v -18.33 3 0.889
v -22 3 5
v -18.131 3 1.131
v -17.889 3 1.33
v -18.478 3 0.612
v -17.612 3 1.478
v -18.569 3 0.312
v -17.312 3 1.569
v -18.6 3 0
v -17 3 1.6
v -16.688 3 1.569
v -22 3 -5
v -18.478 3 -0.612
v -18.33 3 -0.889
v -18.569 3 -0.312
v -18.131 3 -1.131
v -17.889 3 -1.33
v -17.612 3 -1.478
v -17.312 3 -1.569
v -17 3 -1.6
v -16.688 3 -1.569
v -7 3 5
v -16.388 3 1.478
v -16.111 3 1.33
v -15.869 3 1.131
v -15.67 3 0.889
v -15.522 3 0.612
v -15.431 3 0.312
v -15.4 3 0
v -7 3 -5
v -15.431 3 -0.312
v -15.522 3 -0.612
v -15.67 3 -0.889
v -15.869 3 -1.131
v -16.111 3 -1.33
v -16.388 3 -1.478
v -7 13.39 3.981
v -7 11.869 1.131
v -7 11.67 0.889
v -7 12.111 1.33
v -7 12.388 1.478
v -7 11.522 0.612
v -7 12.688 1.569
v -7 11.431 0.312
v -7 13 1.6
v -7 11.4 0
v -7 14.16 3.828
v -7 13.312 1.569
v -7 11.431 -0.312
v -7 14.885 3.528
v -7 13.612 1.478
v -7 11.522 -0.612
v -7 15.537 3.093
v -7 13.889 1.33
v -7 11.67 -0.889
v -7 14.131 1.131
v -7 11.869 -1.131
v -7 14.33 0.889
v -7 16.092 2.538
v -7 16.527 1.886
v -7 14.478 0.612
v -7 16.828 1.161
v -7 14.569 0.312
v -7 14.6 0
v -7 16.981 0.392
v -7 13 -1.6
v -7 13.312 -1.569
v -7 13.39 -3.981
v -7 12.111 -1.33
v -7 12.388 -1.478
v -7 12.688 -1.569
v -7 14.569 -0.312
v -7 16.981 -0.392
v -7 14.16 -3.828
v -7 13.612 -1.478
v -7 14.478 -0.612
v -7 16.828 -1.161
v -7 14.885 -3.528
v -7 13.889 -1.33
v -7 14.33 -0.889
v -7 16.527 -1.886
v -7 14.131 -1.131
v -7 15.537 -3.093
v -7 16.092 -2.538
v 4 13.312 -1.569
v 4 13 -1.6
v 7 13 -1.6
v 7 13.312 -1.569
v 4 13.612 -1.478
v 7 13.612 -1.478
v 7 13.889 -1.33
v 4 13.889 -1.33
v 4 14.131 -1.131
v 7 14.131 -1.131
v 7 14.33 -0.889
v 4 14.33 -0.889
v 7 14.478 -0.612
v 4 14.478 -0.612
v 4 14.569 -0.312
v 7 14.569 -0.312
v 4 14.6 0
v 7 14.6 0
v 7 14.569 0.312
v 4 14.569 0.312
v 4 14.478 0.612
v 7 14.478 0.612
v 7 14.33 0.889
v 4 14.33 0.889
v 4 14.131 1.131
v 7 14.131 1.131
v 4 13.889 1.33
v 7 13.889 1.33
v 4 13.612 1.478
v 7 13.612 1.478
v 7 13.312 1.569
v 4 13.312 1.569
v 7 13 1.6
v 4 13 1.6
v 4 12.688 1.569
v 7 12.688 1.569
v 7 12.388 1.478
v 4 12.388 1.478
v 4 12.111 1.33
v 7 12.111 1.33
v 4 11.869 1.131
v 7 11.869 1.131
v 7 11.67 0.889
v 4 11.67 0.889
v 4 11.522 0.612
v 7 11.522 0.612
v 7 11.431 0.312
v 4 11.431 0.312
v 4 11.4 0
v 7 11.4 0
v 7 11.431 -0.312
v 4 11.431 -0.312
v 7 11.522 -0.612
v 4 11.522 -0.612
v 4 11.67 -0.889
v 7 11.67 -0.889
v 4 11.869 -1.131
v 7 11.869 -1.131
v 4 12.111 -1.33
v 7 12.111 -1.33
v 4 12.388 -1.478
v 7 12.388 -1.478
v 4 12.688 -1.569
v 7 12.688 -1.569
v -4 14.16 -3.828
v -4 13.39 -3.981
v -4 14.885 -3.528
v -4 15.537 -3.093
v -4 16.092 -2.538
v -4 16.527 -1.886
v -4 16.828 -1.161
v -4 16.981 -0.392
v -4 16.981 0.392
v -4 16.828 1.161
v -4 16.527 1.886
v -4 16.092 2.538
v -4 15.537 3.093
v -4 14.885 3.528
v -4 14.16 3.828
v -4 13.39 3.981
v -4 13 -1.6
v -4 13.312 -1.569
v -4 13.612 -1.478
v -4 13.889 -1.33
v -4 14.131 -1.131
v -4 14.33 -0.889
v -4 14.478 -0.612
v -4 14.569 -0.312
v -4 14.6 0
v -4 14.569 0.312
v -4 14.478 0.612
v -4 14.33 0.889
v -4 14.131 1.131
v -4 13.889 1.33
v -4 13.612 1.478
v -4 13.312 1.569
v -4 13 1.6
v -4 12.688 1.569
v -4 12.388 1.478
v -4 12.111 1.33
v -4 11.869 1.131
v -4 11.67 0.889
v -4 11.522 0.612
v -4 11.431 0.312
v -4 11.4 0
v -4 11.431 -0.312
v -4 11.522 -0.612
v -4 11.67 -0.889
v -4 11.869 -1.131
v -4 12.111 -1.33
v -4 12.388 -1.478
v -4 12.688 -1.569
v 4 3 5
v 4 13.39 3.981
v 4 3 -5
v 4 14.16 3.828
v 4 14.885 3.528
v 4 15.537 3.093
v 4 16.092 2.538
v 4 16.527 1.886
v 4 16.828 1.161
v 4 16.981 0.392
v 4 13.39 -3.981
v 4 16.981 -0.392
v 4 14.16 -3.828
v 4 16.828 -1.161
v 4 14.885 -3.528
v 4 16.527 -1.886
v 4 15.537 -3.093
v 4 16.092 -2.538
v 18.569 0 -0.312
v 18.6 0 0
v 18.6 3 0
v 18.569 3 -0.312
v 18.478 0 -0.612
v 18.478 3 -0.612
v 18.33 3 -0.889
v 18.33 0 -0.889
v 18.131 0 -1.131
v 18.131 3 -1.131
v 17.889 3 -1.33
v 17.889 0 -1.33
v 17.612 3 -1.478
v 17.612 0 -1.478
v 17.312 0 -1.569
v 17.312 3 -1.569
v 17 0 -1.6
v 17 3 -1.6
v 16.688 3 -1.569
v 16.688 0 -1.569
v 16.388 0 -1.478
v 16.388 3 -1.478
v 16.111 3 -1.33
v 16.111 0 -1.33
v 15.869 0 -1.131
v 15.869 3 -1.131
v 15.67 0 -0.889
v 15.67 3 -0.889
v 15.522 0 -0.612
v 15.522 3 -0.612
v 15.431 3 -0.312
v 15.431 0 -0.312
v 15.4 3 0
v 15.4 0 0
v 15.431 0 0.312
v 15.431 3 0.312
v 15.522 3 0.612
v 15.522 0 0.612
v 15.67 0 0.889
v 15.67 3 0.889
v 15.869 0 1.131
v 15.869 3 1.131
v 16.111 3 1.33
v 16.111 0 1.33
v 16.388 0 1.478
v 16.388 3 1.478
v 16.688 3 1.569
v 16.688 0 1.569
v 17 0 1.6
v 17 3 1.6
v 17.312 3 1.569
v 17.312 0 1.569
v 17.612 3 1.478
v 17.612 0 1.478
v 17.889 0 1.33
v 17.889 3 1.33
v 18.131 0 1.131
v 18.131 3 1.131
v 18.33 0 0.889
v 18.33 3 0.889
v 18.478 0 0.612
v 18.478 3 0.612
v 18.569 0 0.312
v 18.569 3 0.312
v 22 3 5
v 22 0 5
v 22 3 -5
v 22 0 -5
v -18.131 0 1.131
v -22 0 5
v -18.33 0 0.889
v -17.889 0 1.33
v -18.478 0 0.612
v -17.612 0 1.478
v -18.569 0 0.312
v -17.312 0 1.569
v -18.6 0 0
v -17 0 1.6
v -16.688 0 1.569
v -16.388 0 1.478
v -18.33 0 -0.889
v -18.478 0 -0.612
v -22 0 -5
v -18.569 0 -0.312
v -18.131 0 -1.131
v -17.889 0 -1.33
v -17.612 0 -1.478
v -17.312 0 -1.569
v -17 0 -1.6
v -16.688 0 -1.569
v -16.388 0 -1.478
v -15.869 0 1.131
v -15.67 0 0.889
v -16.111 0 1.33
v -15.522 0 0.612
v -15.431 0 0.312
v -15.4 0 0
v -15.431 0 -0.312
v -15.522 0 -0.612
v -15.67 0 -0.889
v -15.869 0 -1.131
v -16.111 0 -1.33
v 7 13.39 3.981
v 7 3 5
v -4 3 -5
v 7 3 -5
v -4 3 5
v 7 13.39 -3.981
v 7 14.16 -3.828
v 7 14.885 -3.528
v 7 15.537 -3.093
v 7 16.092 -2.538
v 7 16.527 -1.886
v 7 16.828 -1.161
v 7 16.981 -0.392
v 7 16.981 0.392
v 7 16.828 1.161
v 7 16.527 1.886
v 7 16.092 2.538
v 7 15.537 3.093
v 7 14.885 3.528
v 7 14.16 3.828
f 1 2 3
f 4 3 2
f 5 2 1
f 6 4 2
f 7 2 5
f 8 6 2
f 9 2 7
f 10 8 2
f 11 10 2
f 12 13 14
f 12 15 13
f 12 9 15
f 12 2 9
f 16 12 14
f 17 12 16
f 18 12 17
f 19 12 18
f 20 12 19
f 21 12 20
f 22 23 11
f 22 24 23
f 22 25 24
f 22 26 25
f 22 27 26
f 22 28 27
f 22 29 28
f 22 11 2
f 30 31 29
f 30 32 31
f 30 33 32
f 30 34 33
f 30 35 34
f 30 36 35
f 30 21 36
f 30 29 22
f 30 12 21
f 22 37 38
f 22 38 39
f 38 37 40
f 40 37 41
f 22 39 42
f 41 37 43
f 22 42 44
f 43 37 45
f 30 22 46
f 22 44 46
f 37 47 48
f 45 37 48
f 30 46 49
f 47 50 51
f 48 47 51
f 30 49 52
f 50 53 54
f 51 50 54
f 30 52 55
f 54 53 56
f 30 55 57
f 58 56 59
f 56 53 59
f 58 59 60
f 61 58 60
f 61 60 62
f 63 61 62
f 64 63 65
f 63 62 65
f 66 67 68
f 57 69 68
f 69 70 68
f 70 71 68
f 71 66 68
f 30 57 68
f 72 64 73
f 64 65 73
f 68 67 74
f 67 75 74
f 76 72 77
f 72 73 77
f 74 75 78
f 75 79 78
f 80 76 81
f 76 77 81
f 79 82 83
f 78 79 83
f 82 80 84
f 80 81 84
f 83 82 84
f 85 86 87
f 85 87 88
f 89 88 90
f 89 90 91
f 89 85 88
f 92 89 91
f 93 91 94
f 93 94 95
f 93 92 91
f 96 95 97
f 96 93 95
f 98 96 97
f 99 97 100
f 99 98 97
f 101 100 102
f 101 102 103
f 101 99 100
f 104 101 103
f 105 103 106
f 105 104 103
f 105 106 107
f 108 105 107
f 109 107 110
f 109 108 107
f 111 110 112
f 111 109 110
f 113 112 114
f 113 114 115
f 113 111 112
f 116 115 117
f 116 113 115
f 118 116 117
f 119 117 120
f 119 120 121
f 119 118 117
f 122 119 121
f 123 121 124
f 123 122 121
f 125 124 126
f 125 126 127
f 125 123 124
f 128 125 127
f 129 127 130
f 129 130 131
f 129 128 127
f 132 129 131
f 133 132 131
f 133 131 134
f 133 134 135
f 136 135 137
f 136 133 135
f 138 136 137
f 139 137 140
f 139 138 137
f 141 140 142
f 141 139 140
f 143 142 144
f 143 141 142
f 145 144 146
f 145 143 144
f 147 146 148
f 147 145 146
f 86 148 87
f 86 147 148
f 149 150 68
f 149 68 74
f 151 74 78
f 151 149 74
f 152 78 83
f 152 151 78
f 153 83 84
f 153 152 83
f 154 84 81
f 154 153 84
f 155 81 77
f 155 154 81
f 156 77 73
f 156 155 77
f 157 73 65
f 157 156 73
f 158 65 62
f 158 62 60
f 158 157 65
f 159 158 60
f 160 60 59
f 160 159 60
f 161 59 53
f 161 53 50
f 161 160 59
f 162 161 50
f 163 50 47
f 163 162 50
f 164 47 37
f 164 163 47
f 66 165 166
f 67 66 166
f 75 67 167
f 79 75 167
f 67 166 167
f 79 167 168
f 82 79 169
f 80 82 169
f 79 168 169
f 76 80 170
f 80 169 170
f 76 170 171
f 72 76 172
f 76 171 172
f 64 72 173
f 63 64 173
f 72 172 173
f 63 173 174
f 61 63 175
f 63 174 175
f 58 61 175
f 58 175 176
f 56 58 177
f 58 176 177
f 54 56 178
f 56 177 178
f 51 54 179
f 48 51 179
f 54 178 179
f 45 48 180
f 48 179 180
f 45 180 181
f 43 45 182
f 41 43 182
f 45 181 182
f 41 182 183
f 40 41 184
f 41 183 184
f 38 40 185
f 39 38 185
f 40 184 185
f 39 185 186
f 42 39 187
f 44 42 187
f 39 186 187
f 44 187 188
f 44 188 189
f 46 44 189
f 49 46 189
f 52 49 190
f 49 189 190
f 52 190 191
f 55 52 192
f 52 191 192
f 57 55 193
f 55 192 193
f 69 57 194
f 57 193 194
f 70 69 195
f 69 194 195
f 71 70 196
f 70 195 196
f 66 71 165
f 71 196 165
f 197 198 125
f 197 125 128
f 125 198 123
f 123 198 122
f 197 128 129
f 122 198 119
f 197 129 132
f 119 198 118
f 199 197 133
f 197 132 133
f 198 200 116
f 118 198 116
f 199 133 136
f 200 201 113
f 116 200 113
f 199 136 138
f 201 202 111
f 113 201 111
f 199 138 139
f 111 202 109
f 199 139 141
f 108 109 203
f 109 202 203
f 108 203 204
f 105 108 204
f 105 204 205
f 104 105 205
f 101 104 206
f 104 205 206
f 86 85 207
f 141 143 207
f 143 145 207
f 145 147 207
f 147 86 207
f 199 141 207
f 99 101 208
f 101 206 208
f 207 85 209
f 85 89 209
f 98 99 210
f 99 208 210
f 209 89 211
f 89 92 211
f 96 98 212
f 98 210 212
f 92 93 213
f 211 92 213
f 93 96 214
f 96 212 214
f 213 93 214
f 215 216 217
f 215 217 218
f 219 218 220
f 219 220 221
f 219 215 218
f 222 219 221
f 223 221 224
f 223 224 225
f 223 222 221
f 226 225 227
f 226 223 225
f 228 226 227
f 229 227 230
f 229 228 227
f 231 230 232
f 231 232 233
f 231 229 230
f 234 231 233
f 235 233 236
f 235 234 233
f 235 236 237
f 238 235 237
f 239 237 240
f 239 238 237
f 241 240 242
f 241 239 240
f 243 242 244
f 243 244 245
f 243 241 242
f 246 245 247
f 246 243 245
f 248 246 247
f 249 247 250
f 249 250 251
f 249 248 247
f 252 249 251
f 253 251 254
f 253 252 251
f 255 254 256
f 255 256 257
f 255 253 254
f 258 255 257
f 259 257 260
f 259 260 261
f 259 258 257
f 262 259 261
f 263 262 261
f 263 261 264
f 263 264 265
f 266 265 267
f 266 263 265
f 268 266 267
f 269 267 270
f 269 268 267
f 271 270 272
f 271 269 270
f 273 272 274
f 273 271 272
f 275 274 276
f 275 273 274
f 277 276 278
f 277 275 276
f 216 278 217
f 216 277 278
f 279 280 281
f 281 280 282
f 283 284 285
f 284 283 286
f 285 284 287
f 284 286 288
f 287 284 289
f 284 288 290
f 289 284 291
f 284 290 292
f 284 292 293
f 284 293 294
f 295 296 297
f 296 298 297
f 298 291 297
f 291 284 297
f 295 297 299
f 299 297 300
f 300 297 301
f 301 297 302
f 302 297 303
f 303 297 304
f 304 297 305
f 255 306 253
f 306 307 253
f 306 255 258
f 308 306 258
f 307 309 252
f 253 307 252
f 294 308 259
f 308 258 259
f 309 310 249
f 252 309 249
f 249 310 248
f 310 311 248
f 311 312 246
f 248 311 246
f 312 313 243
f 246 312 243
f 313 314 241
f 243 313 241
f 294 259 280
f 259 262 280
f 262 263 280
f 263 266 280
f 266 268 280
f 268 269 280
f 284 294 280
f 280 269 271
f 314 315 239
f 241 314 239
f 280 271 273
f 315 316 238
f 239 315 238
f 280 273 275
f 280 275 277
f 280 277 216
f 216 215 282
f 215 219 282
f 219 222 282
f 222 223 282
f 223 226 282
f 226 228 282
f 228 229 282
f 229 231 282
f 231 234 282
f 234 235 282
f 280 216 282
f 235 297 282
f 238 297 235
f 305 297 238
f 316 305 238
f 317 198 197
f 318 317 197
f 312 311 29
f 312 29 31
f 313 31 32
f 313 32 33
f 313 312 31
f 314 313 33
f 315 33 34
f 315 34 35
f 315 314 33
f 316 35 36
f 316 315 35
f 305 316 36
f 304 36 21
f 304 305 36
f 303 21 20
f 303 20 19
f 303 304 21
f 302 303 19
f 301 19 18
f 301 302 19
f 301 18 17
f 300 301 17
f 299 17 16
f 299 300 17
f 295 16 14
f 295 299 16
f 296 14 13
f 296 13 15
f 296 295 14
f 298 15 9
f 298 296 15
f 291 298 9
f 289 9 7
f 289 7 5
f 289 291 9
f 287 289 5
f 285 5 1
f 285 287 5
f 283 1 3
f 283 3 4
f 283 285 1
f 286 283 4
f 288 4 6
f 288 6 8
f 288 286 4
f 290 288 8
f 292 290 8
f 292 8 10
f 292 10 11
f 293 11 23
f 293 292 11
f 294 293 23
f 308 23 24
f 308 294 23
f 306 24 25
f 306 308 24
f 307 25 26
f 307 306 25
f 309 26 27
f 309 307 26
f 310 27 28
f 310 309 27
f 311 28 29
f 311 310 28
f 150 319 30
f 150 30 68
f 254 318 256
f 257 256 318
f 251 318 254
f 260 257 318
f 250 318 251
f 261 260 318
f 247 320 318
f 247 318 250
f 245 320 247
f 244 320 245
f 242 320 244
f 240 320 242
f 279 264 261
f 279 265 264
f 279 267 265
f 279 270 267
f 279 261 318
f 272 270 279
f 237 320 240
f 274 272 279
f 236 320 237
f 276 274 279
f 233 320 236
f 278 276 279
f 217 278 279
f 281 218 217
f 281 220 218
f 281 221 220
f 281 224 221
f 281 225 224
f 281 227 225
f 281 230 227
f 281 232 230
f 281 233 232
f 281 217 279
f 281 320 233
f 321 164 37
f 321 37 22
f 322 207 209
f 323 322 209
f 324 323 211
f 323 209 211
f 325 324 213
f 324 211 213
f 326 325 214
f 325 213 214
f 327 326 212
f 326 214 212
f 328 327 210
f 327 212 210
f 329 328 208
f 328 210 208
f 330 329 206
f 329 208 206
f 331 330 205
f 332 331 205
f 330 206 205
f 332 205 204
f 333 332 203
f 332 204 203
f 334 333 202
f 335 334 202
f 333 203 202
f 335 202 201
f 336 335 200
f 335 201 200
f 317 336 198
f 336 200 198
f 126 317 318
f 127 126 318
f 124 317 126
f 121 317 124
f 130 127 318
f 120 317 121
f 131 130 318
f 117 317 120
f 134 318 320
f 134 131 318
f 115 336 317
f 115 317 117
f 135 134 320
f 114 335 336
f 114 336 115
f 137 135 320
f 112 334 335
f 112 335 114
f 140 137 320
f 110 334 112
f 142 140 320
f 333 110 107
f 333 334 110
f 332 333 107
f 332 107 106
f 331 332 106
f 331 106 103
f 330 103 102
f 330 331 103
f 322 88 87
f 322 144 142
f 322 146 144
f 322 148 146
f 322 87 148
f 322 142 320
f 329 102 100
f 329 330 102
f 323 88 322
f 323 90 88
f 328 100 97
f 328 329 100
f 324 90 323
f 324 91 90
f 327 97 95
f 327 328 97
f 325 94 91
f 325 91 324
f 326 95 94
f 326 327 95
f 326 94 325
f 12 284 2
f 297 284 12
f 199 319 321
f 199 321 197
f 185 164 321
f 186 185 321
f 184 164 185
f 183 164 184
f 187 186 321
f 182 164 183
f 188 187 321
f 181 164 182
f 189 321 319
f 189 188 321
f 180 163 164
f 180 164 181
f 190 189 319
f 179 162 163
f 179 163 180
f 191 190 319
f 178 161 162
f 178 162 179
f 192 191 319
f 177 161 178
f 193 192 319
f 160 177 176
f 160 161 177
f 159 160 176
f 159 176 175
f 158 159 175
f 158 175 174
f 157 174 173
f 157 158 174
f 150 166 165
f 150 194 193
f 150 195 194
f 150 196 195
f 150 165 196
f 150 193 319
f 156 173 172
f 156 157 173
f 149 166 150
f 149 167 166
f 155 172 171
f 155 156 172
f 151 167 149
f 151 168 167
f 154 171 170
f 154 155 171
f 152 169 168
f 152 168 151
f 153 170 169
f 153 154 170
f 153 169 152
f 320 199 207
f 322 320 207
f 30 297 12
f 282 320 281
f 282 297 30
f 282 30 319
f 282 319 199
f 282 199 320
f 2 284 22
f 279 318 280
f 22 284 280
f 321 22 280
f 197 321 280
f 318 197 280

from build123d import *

# Parameters (mm, degrees)
SKETCH_1_W      = 44
SKETCH_1_H      = 10
SKETCH_1_R      = 1.6
EXTRUDE_1_DEPTH = 3
SKETCH_2_R      = 4
SKETCH_2_R_2    = 1.6
EXTRUDE_2_DEPTH = 3


with BuildPart() as part:
    # 草图1 → 凸台-拉伸1 (new body)
    with BuildSketch(Plane(origin=(0, 0, 0), x_dir=(1, 0, 0), z_dir=(0, 1, 0))):
        Rectangle(SKETCH_1_W, SKETCH_1_H)
        with Locations((17, 0)):
            Circle(SKETCH_1_R, mode=Mode.SUBTRACT)
        with Locations((-17, 0)):
            Circle(SKETCH_1_R, mode=Mode.SUBTRACT)
    extrude(amount=EXTRUDE_1_DEPTH)

    # 草图2 → 凸台-拉伸2 (add)
    with BuildSketch(Plane(origin=(4, 0, 0), x_dir=(0, 0, -1), z_dir=(1, 0, 0))):
        with BuildLine():
            Line((-5, 3), (5, 3))
            Line((5, 3), (3.980898083, 13.390449041))
            ThreePointArc((3.980898083, 13.390449041), (3.995221667, 13.195458012), (4, 13))
            ThreePointArc((4, 13), (-0.195458012, 9.004778333), (-3.980898083, 13.390449041))
            Line((-3.980898083, 13.390449041), (-5, 3))
        make_face()
        with Locations((0, 13)):
            Circle(SKETCH_2_R)
        with Locations((0, 13)):
            Circle(SKETCH_2_R_2, mode=Mode.SUBTRACT)
    extrude_2 = extrude(amount=EXTRUDE_2_DEPTH)

    # 镜向1: 凸台-拉伸2 across plane
    add(extrude_2.mirror(Plane(origin=(0, 0, 0), x_dir=(0, 0, 1), z_dir=(1, 0, 0))))


solid = part.part
